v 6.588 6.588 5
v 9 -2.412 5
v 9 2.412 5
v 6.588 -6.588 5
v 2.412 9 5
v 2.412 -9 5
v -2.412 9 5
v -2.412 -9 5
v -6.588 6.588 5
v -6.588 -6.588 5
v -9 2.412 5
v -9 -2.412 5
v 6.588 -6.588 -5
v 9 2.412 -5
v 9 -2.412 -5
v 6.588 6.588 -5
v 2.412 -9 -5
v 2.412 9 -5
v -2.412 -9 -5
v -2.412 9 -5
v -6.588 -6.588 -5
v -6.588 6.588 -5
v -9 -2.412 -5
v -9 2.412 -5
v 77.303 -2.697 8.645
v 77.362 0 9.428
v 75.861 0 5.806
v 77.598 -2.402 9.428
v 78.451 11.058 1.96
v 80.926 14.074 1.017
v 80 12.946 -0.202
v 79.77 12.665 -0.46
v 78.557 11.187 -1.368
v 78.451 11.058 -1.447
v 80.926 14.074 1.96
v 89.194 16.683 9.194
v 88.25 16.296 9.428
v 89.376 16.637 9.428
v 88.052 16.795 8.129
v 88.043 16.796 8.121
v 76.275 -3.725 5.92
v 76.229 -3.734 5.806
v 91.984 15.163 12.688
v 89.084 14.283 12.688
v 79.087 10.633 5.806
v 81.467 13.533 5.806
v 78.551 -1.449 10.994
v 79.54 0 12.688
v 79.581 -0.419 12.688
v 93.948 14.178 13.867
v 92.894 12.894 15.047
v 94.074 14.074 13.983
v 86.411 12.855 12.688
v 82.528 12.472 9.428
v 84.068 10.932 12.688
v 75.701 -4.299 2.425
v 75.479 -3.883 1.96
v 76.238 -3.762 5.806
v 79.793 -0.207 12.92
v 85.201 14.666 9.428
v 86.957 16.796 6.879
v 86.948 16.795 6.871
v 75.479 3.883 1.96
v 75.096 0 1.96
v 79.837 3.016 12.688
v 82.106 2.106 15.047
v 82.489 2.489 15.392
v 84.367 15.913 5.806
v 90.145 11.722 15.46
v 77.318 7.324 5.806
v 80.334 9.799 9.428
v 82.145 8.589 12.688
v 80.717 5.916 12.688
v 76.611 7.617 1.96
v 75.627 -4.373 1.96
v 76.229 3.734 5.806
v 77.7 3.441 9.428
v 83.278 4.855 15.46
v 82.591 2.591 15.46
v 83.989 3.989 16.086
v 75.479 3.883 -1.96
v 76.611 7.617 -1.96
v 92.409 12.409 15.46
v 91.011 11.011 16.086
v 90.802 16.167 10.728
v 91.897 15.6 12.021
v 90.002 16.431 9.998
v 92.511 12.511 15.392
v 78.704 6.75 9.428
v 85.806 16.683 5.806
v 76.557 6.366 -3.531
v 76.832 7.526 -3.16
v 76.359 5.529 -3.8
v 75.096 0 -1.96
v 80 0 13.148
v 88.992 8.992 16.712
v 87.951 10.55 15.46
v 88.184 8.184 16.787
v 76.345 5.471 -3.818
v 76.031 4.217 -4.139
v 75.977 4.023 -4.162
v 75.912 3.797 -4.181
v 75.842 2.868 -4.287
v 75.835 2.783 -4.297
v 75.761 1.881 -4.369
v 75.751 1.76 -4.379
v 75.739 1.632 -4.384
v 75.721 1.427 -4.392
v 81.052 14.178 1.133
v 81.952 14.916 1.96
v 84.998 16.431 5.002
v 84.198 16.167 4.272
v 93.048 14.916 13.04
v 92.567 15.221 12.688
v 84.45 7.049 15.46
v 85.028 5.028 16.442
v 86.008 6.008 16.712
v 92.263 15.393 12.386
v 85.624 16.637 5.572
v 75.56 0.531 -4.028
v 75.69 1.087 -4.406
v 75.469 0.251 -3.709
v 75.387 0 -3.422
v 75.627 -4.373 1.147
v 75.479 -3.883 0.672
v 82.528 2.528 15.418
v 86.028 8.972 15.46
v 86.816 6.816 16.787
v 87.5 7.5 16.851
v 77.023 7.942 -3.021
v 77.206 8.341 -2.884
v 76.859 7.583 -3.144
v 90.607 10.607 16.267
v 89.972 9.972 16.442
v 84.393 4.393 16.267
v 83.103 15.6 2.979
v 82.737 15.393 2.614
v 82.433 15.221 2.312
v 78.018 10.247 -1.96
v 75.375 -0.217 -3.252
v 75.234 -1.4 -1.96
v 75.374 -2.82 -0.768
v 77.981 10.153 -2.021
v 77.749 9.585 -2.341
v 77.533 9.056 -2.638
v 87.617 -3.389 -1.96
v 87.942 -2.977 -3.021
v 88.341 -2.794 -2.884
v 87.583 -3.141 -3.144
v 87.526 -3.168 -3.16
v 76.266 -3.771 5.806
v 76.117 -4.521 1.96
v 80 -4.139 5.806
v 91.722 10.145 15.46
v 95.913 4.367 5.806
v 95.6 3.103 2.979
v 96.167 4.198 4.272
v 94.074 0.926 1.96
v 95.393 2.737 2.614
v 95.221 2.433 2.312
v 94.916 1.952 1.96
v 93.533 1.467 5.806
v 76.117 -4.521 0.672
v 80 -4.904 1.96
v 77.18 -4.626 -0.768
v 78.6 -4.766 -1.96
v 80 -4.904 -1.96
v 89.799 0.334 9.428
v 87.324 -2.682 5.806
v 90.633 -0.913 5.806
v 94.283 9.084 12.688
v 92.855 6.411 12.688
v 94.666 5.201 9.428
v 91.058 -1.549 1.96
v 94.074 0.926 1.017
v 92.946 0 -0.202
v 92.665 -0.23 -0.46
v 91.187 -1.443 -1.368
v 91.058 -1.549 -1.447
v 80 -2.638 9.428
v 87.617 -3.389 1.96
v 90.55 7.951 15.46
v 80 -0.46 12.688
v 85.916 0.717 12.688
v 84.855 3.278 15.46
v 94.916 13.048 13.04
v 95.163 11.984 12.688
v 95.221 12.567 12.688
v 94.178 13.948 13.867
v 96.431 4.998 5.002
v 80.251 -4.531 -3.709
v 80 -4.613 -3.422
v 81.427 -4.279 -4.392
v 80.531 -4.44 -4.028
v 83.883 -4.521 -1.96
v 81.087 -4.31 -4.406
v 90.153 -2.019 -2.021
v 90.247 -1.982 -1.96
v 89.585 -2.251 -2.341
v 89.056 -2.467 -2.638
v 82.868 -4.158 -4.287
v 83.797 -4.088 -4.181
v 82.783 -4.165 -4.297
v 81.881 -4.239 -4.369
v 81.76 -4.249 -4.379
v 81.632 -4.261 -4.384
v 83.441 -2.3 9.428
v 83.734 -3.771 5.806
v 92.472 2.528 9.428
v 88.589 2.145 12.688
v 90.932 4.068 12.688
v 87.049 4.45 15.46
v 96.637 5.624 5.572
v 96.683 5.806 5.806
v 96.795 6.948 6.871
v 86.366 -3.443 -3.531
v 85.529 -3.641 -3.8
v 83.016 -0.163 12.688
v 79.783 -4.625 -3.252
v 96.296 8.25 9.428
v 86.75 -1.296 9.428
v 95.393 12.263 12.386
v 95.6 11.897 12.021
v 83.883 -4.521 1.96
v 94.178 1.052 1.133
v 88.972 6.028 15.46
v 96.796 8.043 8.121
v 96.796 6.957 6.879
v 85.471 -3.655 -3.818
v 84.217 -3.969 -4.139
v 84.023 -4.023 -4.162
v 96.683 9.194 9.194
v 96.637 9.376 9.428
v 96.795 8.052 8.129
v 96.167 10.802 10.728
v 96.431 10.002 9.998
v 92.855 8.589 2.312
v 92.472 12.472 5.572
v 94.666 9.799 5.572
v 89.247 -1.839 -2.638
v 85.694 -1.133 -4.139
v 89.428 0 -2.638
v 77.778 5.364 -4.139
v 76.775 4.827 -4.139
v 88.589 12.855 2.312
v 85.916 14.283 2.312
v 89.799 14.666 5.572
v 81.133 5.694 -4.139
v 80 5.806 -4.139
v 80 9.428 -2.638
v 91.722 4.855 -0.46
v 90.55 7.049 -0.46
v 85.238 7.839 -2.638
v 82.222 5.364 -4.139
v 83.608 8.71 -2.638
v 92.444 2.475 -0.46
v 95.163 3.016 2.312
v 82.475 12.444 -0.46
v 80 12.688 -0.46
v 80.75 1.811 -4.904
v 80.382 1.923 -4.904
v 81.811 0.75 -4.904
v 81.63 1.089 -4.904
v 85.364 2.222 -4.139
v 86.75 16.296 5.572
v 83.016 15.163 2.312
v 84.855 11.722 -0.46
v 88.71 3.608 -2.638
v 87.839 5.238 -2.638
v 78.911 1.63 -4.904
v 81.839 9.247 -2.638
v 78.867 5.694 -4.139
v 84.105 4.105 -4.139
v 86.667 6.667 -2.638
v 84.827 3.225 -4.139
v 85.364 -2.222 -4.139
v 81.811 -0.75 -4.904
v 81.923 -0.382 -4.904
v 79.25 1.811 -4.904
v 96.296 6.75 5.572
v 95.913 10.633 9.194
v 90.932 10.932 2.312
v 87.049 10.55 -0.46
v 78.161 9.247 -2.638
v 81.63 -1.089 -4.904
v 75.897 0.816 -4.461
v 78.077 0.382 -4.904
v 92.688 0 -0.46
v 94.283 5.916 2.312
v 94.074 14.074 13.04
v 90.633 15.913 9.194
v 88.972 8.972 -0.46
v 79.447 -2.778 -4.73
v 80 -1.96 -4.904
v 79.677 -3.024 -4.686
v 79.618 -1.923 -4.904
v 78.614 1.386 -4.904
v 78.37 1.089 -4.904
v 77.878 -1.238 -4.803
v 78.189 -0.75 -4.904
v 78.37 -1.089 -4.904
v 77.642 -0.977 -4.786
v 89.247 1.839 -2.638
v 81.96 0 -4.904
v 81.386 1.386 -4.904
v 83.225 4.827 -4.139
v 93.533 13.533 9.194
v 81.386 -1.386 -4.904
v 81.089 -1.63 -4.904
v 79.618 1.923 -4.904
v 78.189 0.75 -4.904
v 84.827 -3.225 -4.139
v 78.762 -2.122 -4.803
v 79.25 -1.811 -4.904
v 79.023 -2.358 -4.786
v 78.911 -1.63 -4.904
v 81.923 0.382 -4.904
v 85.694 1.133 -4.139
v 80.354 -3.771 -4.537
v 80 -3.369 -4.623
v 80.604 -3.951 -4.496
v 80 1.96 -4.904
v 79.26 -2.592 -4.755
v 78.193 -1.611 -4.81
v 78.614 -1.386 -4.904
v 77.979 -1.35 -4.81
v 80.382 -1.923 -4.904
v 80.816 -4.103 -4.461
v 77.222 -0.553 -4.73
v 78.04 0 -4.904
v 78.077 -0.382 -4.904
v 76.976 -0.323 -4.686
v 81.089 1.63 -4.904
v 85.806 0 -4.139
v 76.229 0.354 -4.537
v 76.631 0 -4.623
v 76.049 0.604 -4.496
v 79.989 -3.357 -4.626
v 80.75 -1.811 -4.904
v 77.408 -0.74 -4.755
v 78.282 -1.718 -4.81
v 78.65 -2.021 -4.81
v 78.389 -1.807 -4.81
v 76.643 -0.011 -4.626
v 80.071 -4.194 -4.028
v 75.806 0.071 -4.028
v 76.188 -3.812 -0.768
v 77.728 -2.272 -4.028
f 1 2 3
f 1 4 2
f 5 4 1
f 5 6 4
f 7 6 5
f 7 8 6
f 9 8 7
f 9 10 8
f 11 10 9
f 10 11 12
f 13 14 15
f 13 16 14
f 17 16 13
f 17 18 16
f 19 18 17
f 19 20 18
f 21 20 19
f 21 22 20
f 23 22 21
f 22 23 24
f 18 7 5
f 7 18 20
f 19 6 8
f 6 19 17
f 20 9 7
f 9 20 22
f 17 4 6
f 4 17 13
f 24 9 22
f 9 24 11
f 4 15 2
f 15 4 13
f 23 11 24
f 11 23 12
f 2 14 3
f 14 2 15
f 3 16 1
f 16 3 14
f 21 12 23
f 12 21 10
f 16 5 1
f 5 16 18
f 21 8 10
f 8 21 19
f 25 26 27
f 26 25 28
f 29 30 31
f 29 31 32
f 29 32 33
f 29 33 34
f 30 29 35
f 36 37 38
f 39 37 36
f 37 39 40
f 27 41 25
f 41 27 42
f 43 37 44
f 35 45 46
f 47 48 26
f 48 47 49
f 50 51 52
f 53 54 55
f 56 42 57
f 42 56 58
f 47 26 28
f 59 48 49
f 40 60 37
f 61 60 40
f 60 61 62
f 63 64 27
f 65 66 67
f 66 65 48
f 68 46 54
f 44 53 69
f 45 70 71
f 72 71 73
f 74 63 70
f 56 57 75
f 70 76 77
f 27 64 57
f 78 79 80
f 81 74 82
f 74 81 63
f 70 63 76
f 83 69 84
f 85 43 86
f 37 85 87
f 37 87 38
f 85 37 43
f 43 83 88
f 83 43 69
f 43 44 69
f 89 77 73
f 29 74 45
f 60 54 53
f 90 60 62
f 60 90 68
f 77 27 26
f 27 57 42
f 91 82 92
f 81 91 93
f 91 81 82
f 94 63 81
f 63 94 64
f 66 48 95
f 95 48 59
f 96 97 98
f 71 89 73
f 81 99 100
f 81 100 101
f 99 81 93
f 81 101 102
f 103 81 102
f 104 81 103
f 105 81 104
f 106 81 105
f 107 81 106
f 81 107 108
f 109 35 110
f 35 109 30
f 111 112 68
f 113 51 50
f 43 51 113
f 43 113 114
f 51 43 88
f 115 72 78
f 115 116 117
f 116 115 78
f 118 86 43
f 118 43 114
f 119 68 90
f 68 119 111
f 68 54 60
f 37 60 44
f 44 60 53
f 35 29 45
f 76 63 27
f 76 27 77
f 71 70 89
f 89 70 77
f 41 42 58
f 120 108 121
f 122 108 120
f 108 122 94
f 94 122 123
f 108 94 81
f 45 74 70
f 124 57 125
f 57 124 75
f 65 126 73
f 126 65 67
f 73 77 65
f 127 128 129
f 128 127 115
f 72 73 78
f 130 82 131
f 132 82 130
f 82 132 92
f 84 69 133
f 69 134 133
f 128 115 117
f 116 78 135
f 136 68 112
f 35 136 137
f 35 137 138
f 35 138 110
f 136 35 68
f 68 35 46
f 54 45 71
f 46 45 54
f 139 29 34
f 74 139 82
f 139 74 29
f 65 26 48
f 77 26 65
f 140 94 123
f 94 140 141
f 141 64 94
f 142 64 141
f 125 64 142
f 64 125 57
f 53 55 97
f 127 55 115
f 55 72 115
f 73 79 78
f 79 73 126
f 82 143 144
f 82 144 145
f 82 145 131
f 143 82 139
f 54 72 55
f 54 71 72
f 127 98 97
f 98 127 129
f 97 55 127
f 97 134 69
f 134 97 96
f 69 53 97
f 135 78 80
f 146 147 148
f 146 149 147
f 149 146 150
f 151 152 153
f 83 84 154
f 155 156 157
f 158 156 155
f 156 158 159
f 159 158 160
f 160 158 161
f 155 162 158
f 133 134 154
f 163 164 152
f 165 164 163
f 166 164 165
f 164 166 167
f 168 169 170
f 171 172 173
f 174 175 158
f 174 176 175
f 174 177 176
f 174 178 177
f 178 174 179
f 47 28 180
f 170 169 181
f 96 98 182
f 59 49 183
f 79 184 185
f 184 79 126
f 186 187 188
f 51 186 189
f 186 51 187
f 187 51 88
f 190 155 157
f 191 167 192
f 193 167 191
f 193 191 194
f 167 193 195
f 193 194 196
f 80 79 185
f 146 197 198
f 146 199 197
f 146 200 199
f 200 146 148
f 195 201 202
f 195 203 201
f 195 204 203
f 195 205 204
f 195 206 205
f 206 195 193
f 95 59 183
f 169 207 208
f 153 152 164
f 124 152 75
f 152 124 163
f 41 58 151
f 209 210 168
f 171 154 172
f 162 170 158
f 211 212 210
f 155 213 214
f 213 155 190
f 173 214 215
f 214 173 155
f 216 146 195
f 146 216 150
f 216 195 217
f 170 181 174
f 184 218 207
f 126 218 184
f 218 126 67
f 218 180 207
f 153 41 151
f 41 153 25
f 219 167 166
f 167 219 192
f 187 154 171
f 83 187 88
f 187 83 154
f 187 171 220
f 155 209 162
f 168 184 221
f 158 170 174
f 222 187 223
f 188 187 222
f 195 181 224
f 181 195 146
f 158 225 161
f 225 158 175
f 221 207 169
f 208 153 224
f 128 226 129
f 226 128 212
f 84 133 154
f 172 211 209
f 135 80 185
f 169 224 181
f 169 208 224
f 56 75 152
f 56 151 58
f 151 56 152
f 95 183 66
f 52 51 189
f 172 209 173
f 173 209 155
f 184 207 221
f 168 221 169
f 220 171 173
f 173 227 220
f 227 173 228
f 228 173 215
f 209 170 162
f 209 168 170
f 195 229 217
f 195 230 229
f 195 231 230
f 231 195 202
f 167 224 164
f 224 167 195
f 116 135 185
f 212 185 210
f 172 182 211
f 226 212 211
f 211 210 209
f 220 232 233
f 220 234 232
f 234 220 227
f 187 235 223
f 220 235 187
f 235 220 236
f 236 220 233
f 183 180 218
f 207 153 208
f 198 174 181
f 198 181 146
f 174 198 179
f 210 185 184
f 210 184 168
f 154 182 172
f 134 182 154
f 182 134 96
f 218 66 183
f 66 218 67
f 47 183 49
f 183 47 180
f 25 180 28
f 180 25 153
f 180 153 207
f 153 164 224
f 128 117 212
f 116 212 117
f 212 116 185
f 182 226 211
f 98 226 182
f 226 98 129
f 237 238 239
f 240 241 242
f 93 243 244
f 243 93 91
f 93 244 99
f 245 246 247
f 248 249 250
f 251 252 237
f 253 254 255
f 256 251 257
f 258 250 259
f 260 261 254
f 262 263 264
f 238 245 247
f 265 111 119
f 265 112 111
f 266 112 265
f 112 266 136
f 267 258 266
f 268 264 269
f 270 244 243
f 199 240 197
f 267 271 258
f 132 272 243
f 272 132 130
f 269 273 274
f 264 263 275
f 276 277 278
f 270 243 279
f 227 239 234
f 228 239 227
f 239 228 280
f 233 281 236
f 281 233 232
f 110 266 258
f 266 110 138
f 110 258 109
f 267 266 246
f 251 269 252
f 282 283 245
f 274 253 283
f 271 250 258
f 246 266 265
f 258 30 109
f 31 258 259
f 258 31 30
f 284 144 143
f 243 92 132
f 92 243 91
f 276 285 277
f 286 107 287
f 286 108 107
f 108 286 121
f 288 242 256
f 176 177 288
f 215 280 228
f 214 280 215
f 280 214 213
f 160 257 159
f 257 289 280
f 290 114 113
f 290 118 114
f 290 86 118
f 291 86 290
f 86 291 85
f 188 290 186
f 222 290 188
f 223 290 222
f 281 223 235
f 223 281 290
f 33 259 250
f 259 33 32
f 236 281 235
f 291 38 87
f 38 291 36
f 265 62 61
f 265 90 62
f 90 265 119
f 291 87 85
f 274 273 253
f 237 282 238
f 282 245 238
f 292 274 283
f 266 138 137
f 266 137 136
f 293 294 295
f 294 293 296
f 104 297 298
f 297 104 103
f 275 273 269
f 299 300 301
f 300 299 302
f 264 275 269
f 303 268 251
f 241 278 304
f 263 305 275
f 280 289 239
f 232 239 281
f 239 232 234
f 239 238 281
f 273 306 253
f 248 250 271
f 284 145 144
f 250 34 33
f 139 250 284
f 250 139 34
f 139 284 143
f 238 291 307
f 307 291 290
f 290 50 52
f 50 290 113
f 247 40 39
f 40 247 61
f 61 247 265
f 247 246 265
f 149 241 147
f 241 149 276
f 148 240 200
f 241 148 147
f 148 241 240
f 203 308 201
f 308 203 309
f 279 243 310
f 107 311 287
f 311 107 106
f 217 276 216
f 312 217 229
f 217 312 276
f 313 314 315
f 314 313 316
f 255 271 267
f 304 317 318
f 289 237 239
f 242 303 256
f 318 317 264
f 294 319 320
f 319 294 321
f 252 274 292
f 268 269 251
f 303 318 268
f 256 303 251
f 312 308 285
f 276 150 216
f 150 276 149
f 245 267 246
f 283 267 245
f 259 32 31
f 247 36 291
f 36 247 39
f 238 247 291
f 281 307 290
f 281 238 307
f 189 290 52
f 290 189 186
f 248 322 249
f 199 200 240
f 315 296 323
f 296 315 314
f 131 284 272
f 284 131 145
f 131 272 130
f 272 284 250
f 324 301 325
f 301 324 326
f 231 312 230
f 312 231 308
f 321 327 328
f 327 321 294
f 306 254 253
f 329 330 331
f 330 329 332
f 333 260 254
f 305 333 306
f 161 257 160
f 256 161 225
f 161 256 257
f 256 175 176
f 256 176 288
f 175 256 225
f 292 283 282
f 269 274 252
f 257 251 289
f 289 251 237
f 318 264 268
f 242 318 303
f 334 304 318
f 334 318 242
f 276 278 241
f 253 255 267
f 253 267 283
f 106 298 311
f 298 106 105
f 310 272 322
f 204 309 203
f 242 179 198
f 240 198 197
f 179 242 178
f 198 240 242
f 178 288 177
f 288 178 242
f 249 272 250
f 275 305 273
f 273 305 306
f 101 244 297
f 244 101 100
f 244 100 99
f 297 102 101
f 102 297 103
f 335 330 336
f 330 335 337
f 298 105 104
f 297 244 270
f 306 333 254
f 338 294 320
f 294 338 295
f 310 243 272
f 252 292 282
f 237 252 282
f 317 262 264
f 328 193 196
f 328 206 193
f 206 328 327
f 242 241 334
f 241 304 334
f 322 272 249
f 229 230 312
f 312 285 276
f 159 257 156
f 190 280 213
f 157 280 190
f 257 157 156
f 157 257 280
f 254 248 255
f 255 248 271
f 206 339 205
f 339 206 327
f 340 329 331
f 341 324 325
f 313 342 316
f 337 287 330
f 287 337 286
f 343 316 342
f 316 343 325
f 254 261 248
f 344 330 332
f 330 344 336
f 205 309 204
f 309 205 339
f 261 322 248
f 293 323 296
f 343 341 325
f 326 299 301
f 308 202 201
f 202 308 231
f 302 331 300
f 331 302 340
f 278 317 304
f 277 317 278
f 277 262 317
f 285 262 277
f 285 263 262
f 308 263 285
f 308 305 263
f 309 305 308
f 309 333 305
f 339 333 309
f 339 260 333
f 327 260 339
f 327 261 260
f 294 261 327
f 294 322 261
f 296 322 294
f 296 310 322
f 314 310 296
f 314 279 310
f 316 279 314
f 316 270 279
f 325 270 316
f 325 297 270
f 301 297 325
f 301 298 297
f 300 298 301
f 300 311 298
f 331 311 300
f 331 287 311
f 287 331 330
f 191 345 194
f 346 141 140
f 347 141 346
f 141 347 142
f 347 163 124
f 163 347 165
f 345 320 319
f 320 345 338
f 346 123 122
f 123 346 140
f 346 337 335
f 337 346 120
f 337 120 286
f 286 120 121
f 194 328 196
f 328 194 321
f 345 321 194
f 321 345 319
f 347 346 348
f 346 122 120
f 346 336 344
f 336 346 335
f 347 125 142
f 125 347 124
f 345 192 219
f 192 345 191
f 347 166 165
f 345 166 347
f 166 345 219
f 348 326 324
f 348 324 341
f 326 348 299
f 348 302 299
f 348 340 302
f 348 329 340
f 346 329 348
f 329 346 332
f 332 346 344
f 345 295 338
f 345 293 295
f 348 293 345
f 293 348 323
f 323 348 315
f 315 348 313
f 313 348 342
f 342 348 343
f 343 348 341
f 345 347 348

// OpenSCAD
// intersection_for(): intersect every pass of a loop.
//
// A plain for() unions its passes. This one keeps only what they all
// have in common -- and it exists because you cannot write
// intersection() { for (...) ... }, which would intersect the single
// union that the for produced.

// Rotating a slot around the origin leaves the shape common to them all.
intersection_for (a = [0 : 30 : 179])
    rotate([0, 0, a])
        cube([60, 18, 10], center=true);

// The same idea in 3D: spheres from several directions, whittling a
// solid down to their shared core.
translate([80, 0, 0])
    intersection_for (v = [[1,0,0], [0,1,0], [0,0,1], [1,1,1]])
        translate(15 * v / norm(v))
            sphere(20, $fn=32);
